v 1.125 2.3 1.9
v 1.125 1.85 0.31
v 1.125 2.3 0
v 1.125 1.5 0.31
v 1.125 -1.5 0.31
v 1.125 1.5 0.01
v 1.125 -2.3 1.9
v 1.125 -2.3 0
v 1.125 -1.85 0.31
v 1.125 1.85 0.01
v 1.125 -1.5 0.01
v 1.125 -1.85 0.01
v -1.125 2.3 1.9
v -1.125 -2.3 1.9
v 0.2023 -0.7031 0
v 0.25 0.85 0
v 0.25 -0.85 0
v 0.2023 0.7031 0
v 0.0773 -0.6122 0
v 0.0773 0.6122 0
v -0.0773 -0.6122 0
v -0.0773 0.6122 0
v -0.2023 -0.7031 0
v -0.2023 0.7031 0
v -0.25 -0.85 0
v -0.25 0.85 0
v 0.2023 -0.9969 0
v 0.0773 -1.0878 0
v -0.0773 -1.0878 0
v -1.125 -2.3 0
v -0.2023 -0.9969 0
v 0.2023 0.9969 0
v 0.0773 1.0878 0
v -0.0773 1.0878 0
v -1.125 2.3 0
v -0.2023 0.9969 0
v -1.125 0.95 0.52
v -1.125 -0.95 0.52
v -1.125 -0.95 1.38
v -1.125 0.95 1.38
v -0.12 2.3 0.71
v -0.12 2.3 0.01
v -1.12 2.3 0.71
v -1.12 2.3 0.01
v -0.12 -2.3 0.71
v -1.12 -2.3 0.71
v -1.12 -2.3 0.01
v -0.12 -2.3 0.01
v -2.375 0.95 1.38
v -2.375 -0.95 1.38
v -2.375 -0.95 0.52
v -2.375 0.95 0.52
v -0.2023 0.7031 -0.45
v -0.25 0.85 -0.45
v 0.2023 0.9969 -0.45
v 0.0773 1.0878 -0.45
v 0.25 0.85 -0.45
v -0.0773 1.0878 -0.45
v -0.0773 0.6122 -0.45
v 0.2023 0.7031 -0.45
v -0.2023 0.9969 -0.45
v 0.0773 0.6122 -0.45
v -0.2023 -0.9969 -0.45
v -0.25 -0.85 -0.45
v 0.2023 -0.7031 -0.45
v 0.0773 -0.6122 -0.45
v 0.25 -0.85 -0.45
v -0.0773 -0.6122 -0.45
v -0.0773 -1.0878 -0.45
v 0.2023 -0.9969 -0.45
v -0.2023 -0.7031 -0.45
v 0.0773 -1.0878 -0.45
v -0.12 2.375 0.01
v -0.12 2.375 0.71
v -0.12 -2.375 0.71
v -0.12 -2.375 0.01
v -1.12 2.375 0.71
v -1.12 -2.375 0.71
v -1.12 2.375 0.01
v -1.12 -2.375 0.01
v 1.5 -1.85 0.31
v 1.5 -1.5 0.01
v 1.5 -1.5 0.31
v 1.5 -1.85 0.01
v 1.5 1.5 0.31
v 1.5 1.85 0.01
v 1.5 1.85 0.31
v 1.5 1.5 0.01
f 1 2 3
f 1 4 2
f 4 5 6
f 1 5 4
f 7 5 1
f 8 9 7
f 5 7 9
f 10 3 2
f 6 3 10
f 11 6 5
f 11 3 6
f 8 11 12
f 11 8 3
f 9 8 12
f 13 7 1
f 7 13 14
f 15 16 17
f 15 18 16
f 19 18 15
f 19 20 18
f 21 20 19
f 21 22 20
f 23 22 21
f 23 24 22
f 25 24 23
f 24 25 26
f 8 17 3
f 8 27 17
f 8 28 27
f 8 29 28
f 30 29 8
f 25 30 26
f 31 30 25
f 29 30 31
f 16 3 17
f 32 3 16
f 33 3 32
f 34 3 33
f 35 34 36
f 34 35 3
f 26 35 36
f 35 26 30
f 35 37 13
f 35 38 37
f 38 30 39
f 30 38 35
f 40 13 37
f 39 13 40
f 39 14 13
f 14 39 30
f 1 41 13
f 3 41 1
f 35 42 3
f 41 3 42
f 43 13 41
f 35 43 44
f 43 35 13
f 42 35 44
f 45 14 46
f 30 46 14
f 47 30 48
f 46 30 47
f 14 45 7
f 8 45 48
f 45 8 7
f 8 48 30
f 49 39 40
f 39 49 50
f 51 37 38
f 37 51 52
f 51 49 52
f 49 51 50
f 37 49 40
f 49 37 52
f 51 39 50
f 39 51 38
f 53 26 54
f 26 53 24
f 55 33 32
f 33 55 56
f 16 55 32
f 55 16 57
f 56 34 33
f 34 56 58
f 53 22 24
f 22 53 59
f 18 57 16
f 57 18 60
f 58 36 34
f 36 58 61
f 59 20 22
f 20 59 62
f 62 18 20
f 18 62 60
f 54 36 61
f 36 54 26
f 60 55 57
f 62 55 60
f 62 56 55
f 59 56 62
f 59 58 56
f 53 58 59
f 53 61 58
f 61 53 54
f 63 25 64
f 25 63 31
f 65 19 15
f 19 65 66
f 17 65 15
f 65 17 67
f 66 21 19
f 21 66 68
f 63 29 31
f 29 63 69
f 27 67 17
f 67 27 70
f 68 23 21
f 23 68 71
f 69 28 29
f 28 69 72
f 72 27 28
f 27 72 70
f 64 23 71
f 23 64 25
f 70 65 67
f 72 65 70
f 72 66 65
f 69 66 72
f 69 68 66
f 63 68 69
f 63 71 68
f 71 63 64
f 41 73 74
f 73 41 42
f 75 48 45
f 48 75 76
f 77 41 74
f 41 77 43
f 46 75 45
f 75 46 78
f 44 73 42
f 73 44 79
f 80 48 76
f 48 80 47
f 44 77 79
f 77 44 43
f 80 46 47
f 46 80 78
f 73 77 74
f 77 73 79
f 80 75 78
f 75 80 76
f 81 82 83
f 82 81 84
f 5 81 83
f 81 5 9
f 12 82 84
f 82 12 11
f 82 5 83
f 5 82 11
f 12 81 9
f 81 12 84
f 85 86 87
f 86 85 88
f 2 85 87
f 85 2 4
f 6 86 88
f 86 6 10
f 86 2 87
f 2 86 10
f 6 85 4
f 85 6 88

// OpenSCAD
color("snow")translate([-2.25/2,-4.6/2])cube([2.25,4.6,1.9]);
color("black")translate([-1.25-2.25/2,-1.9/2,1.9/2-0.43])cube([1.25,1.9,0.86]);

color("snow")translate([0,1.7/2,-0.45])cylinder(d=0.5,h=0.45,$fn=10);
color("snow")translate([0,-1.7/2,-0.45])cylinder(d=0.5,h=0.45,$fn=10);

color("lightgray")translate([-2.24/2,-4.75/2,0.01])cube([1,4.75,0.7]);

color("lightgray")translate([0.5,-3.35/2-0.35/2,0.01])cube([1,0.35,0.3]);
color("lightgray")translate([0.5,3.35/2-0.35/2,0.01])cube([1,0.35,0.3]);
